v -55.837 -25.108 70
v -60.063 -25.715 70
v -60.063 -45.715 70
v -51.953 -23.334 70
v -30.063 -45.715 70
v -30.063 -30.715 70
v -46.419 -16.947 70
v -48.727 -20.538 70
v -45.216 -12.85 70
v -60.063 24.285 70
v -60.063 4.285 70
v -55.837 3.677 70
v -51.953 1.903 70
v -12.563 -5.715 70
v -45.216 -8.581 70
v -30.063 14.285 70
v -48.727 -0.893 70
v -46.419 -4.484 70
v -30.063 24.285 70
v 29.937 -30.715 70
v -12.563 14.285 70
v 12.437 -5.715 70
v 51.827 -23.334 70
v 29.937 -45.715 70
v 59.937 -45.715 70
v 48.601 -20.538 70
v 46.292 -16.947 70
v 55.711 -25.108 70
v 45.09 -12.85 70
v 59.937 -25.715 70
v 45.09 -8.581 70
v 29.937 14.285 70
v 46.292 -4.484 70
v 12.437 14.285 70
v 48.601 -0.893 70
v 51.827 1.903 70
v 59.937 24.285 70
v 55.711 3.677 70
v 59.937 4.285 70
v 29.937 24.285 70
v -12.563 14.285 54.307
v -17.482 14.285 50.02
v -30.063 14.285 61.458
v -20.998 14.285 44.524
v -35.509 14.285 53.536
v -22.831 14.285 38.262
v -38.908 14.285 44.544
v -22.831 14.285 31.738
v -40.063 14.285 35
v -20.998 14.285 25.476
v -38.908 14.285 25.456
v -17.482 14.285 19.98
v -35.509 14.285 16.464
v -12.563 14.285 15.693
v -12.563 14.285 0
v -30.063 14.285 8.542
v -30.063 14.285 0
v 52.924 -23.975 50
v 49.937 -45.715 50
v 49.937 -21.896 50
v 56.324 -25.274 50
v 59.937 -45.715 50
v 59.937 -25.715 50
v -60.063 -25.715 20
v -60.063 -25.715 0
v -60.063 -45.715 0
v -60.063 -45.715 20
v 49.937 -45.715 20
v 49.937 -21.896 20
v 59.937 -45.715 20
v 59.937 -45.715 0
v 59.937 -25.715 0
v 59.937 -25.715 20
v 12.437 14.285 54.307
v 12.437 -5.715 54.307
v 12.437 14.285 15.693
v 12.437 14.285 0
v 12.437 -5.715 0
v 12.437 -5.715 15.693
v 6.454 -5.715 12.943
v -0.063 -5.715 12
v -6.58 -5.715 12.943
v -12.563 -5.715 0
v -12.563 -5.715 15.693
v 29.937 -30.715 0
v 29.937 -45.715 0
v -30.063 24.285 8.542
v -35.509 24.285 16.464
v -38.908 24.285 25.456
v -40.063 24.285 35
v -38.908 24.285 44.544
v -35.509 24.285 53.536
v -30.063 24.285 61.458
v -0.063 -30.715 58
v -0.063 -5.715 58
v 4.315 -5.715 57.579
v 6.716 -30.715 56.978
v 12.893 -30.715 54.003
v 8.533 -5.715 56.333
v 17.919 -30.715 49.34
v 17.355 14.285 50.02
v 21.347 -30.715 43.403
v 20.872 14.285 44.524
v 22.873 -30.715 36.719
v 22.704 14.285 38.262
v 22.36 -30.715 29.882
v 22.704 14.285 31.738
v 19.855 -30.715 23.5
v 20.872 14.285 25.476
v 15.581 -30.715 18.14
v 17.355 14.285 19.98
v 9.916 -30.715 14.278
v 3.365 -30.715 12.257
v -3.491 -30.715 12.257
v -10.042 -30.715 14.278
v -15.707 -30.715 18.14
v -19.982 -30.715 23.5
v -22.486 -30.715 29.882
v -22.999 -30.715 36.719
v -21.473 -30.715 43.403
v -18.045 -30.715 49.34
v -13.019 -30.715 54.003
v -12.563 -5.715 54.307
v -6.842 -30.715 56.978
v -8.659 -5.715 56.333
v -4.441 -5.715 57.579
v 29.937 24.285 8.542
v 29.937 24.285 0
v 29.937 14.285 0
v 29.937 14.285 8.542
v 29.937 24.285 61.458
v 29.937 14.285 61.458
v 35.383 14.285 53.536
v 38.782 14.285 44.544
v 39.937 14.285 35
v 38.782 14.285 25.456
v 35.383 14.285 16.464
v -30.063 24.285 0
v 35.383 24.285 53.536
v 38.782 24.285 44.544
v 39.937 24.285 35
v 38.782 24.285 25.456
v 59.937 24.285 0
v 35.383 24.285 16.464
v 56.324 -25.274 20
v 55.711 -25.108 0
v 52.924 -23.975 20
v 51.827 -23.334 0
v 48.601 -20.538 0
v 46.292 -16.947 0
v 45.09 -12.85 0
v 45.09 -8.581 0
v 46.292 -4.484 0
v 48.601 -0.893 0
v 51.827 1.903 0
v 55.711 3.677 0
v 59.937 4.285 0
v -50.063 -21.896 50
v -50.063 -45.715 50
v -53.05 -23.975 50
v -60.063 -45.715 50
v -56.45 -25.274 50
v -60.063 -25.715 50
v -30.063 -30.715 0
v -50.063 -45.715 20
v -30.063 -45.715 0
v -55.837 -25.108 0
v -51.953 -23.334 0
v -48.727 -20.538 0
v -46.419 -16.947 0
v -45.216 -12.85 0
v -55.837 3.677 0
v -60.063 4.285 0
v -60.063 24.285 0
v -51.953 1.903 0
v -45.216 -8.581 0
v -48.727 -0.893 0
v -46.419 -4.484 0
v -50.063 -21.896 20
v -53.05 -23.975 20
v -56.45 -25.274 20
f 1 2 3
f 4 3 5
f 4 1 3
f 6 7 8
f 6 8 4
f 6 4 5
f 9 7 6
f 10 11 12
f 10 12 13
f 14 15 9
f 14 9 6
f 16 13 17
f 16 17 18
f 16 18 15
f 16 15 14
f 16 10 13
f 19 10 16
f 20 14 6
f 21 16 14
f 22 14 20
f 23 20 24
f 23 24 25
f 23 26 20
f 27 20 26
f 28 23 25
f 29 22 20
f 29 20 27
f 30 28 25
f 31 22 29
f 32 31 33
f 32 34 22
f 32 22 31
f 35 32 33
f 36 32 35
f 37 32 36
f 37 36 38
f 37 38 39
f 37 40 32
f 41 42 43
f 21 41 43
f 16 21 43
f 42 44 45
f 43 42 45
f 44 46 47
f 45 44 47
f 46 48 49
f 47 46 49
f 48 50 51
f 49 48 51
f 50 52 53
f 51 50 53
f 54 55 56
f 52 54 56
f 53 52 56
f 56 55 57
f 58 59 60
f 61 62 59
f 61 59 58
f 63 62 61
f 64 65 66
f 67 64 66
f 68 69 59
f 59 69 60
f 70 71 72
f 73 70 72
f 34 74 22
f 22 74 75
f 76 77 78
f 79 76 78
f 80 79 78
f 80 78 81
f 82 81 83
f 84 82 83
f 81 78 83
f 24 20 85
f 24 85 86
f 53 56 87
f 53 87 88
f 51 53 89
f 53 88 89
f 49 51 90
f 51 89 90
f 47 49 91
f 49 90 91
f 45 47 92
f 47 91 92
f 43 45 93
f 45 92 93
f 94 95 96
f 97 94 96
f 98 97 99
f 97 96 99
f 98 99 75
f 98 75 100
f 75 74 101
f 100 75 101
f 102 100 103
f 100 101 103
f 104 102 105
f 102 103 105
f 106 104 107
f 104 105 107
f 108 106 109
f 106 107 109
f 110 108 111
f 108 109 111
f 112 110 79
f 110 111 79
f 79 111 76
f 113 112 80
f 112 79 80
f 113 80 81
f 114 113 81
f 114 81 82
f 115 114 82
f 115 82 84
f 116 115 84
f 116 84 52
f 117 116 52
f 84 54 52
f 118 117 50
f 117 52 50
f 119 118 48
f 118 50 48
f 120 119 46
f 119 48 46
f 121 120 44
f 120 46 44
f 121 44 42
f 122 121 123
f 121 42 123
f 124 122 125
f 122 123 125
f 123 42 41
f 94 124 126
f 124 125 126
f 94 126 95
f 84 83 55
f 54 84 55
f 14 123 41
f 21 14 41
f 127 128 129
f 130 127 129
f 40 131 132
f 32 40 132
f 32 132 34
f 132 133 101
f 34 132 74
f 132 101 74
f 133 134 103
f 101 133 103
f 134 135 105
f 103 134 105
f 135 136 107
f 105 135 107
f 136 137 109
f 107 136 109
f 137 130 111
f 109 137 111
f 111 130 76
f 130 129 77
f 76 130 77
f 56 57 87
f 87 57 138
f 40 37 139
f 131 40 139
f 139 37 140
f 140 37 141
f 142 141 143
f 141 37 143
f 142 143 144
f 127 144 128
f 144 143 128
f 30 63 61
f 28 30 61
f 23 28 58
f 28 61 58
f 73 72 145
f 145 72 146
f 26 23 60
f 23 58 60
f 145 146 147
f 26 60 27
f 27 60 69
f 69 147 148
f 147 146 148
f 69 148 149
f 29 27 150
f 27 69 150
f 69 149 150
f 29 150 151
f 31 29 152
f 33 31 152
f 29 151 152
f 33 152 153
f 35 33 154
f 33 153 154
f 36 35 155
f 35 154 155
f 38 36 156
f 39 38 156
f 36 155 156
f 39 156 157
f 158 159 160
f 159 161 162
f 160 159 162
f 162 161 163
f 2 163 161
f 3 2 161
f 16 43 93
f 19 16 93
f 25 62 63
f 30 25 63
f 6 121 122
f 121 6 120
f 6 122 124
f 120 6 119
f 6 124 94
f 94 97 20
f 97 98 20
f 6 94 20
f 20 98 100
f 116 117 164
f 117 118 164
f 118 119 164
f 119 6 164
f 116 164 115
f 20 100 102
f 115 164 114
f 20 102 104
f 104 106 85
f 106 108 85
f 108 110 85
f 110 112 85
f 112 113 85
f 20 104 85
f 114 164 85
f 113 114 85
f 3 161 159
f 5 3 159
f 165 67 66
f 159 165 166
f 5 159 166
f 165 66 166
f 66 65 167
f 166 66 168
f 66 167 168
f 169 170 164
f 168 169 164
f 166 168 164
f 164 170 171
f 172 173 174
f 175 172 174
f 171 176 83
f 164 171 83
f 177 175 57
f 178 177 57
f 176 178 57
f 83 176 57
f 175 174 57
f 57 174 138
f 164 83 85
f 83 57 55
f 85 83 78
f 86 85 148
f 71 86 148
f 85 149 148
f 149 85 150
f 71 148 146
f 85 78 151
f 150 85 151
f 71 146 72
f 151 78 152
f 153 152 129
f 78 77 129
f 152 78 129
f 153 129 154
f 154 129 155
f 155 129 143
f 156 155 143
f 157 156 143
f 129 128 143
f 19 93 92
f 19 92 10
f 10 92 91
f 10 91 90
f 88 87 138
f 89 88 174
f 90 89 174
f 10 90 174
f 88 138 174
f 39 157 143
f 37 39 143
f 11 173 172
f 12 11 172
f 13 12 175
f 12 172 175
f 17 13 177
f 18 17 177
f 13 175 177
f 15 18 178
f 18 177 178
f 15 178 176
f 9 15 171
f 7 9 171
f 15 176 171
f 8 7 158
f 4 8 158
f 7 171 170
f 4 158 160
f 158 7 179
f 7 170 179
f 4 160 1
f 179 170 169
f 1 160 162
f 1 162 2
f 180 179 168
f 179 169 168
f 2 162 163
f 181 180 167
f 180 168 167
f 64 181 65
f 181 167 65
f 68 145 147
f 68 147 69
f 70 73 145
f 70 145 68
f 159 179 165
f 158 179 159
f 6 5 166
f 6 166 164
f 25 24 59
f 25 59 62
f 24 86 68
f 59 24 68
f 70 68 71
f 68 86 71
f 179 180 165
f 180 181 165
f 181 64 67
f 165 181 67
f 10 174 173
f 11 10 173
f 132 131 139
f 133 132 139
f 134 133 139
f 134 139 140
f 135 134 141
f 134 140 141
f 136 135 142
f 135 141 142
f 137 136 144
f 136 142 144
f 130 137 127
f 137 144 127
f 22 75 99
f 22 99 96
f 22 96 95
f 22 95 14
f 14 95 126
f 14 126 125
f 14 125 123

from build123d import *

# Parameters (mm, degrees)
BOSS_EXTRUDE1_DEPTH = 70
SKETCH2_R           = 40
CUT_EXTRUDE1_DEPTH  = 10
SKETCH3_R           = 23
CUT_EXTRUDE2_DEPTH  = 66
SKETCH4_W           = 30
SKETCH4_H           = 15
SKETCH4_H_2         = 20
CUT_EXTRUDE3_DEPTH  = 10


with BuildPart() as part:
    # Sketch1 → Boss-Extrude1 (new body)
    with BuildSketch(Plane.XY):
        with BuildLine():
            Line((-60.063092464, -25.71543861), (-60.063092464, -45.71543861))
            Line((-60.063092464, -45.71543861), (-30.063092464, -45.71543861))
            Line((-30.063092464, -45.71543861), (-30.063092464, -30.71543861))
            Line((-30.063092464, -30.71543861), (29.936907536, -30.71543861))
            Line((29.936907536, -30.71543861), (29.936907536, -45.71543861))
            Line((29.936907536, -45.71543861), (59.936907536, -45.71543861))
            Line((59.936907536, -45.71543861), (59.936907536, -25.71543861))
            ThreePointArc((59.936907536, -25.71543861), (44.936907536, -10.71543861), (59.936907536, 4.28456139))
            Line((59.936907536, 4.28456139), (59.936907536, 24.28456139))
            Line((59.936907536, 24.28456139), (29.936907536, 24.28456139))
            Line((29.936907536, 24.28456139), (29.936907536, 14.28456139))
            Line((29.936907536, 14.28456139), (12.436907536, 14.28456139))
            Line((12.436907536, 14.28456139), (12.436907536, -5.71543861))
            Line((12.436907536, -5.71543861), (-12.563092464, -5.71543861))
            Line((-12.563092464, -5.71543861), (-12.563092464, 14.28456139))
            Line((-12.563092464, 14.28456139), (-30.063092464, 14.28456139))
            Line((-30.063092464, 14.28456139), (-30.063092464, 24.28456139))
            Line((-30.063092464, 24.28456139), (-60.063092464, 24.28456139))
            Line((-60.063092464, 24.28456139), (-60.063092464, 4.28456139))
            ThreePointArc((-60.063092464, 4.28456139), (-45.063092464, -10.71543861), (-60.063092464, -25.71543861))
        make_face()
    extrude(amount=BOSS_EXTRUDE1_DEPTH)

    # Sketch2 → Cut-Extrude1 (cut)
    with BuildSketch(Plane(origin=(0, 24.28456139, 0), x_dir=(1, 0, 0), z_dir=(0, 1, 0))):
        with Locations((-0.063092464, -35)):
            Circle(SKETCH2_R)
    extrude(amount=-CUT_EXTRUDE1_DEPTH, mode=Mode.SUBTRACT)

    # Sketch3 → Cut-Extrude2 (cut)
    with BuildSketch(Plane(origin=(0, 14.28456139, 0), x_dir=(1, 0, 0), z_dir=(0, 1, 0))):
        with Locations(Location((-0.063092464, -35, 0), (0, 0, 270))):
            Circle(SKETCH3_R)
    extrude(amount=-CUT_EXTRUDE2_DEPTH, mode=Mode.SUBTRACT)

    # Sketch4 → Cut-Extrude3 (cut)
    with BuildSketch(Plane.ZY.offset(60.063092464)):
        with Locations((35, -18.21543861)):
            Rectangle(SKETCH4_W, SKETCH4_H)
        with Locations((35, -35.71543861)):
            Rectangle(SKETCH4_W, SKETCH4_H_2)
    cut_extrude3 = extrude(amount=-CUT_EXTRUDE3_DEPTH, mode=Mode.SUBTRACT)

    # Mirror1: Cut-Extrude3 across plane
    add(cut_extrude3.mirror(Plane.ZY.offset(0.063092464)), mode=Mode.SUBTRACT)


solid = part.part
